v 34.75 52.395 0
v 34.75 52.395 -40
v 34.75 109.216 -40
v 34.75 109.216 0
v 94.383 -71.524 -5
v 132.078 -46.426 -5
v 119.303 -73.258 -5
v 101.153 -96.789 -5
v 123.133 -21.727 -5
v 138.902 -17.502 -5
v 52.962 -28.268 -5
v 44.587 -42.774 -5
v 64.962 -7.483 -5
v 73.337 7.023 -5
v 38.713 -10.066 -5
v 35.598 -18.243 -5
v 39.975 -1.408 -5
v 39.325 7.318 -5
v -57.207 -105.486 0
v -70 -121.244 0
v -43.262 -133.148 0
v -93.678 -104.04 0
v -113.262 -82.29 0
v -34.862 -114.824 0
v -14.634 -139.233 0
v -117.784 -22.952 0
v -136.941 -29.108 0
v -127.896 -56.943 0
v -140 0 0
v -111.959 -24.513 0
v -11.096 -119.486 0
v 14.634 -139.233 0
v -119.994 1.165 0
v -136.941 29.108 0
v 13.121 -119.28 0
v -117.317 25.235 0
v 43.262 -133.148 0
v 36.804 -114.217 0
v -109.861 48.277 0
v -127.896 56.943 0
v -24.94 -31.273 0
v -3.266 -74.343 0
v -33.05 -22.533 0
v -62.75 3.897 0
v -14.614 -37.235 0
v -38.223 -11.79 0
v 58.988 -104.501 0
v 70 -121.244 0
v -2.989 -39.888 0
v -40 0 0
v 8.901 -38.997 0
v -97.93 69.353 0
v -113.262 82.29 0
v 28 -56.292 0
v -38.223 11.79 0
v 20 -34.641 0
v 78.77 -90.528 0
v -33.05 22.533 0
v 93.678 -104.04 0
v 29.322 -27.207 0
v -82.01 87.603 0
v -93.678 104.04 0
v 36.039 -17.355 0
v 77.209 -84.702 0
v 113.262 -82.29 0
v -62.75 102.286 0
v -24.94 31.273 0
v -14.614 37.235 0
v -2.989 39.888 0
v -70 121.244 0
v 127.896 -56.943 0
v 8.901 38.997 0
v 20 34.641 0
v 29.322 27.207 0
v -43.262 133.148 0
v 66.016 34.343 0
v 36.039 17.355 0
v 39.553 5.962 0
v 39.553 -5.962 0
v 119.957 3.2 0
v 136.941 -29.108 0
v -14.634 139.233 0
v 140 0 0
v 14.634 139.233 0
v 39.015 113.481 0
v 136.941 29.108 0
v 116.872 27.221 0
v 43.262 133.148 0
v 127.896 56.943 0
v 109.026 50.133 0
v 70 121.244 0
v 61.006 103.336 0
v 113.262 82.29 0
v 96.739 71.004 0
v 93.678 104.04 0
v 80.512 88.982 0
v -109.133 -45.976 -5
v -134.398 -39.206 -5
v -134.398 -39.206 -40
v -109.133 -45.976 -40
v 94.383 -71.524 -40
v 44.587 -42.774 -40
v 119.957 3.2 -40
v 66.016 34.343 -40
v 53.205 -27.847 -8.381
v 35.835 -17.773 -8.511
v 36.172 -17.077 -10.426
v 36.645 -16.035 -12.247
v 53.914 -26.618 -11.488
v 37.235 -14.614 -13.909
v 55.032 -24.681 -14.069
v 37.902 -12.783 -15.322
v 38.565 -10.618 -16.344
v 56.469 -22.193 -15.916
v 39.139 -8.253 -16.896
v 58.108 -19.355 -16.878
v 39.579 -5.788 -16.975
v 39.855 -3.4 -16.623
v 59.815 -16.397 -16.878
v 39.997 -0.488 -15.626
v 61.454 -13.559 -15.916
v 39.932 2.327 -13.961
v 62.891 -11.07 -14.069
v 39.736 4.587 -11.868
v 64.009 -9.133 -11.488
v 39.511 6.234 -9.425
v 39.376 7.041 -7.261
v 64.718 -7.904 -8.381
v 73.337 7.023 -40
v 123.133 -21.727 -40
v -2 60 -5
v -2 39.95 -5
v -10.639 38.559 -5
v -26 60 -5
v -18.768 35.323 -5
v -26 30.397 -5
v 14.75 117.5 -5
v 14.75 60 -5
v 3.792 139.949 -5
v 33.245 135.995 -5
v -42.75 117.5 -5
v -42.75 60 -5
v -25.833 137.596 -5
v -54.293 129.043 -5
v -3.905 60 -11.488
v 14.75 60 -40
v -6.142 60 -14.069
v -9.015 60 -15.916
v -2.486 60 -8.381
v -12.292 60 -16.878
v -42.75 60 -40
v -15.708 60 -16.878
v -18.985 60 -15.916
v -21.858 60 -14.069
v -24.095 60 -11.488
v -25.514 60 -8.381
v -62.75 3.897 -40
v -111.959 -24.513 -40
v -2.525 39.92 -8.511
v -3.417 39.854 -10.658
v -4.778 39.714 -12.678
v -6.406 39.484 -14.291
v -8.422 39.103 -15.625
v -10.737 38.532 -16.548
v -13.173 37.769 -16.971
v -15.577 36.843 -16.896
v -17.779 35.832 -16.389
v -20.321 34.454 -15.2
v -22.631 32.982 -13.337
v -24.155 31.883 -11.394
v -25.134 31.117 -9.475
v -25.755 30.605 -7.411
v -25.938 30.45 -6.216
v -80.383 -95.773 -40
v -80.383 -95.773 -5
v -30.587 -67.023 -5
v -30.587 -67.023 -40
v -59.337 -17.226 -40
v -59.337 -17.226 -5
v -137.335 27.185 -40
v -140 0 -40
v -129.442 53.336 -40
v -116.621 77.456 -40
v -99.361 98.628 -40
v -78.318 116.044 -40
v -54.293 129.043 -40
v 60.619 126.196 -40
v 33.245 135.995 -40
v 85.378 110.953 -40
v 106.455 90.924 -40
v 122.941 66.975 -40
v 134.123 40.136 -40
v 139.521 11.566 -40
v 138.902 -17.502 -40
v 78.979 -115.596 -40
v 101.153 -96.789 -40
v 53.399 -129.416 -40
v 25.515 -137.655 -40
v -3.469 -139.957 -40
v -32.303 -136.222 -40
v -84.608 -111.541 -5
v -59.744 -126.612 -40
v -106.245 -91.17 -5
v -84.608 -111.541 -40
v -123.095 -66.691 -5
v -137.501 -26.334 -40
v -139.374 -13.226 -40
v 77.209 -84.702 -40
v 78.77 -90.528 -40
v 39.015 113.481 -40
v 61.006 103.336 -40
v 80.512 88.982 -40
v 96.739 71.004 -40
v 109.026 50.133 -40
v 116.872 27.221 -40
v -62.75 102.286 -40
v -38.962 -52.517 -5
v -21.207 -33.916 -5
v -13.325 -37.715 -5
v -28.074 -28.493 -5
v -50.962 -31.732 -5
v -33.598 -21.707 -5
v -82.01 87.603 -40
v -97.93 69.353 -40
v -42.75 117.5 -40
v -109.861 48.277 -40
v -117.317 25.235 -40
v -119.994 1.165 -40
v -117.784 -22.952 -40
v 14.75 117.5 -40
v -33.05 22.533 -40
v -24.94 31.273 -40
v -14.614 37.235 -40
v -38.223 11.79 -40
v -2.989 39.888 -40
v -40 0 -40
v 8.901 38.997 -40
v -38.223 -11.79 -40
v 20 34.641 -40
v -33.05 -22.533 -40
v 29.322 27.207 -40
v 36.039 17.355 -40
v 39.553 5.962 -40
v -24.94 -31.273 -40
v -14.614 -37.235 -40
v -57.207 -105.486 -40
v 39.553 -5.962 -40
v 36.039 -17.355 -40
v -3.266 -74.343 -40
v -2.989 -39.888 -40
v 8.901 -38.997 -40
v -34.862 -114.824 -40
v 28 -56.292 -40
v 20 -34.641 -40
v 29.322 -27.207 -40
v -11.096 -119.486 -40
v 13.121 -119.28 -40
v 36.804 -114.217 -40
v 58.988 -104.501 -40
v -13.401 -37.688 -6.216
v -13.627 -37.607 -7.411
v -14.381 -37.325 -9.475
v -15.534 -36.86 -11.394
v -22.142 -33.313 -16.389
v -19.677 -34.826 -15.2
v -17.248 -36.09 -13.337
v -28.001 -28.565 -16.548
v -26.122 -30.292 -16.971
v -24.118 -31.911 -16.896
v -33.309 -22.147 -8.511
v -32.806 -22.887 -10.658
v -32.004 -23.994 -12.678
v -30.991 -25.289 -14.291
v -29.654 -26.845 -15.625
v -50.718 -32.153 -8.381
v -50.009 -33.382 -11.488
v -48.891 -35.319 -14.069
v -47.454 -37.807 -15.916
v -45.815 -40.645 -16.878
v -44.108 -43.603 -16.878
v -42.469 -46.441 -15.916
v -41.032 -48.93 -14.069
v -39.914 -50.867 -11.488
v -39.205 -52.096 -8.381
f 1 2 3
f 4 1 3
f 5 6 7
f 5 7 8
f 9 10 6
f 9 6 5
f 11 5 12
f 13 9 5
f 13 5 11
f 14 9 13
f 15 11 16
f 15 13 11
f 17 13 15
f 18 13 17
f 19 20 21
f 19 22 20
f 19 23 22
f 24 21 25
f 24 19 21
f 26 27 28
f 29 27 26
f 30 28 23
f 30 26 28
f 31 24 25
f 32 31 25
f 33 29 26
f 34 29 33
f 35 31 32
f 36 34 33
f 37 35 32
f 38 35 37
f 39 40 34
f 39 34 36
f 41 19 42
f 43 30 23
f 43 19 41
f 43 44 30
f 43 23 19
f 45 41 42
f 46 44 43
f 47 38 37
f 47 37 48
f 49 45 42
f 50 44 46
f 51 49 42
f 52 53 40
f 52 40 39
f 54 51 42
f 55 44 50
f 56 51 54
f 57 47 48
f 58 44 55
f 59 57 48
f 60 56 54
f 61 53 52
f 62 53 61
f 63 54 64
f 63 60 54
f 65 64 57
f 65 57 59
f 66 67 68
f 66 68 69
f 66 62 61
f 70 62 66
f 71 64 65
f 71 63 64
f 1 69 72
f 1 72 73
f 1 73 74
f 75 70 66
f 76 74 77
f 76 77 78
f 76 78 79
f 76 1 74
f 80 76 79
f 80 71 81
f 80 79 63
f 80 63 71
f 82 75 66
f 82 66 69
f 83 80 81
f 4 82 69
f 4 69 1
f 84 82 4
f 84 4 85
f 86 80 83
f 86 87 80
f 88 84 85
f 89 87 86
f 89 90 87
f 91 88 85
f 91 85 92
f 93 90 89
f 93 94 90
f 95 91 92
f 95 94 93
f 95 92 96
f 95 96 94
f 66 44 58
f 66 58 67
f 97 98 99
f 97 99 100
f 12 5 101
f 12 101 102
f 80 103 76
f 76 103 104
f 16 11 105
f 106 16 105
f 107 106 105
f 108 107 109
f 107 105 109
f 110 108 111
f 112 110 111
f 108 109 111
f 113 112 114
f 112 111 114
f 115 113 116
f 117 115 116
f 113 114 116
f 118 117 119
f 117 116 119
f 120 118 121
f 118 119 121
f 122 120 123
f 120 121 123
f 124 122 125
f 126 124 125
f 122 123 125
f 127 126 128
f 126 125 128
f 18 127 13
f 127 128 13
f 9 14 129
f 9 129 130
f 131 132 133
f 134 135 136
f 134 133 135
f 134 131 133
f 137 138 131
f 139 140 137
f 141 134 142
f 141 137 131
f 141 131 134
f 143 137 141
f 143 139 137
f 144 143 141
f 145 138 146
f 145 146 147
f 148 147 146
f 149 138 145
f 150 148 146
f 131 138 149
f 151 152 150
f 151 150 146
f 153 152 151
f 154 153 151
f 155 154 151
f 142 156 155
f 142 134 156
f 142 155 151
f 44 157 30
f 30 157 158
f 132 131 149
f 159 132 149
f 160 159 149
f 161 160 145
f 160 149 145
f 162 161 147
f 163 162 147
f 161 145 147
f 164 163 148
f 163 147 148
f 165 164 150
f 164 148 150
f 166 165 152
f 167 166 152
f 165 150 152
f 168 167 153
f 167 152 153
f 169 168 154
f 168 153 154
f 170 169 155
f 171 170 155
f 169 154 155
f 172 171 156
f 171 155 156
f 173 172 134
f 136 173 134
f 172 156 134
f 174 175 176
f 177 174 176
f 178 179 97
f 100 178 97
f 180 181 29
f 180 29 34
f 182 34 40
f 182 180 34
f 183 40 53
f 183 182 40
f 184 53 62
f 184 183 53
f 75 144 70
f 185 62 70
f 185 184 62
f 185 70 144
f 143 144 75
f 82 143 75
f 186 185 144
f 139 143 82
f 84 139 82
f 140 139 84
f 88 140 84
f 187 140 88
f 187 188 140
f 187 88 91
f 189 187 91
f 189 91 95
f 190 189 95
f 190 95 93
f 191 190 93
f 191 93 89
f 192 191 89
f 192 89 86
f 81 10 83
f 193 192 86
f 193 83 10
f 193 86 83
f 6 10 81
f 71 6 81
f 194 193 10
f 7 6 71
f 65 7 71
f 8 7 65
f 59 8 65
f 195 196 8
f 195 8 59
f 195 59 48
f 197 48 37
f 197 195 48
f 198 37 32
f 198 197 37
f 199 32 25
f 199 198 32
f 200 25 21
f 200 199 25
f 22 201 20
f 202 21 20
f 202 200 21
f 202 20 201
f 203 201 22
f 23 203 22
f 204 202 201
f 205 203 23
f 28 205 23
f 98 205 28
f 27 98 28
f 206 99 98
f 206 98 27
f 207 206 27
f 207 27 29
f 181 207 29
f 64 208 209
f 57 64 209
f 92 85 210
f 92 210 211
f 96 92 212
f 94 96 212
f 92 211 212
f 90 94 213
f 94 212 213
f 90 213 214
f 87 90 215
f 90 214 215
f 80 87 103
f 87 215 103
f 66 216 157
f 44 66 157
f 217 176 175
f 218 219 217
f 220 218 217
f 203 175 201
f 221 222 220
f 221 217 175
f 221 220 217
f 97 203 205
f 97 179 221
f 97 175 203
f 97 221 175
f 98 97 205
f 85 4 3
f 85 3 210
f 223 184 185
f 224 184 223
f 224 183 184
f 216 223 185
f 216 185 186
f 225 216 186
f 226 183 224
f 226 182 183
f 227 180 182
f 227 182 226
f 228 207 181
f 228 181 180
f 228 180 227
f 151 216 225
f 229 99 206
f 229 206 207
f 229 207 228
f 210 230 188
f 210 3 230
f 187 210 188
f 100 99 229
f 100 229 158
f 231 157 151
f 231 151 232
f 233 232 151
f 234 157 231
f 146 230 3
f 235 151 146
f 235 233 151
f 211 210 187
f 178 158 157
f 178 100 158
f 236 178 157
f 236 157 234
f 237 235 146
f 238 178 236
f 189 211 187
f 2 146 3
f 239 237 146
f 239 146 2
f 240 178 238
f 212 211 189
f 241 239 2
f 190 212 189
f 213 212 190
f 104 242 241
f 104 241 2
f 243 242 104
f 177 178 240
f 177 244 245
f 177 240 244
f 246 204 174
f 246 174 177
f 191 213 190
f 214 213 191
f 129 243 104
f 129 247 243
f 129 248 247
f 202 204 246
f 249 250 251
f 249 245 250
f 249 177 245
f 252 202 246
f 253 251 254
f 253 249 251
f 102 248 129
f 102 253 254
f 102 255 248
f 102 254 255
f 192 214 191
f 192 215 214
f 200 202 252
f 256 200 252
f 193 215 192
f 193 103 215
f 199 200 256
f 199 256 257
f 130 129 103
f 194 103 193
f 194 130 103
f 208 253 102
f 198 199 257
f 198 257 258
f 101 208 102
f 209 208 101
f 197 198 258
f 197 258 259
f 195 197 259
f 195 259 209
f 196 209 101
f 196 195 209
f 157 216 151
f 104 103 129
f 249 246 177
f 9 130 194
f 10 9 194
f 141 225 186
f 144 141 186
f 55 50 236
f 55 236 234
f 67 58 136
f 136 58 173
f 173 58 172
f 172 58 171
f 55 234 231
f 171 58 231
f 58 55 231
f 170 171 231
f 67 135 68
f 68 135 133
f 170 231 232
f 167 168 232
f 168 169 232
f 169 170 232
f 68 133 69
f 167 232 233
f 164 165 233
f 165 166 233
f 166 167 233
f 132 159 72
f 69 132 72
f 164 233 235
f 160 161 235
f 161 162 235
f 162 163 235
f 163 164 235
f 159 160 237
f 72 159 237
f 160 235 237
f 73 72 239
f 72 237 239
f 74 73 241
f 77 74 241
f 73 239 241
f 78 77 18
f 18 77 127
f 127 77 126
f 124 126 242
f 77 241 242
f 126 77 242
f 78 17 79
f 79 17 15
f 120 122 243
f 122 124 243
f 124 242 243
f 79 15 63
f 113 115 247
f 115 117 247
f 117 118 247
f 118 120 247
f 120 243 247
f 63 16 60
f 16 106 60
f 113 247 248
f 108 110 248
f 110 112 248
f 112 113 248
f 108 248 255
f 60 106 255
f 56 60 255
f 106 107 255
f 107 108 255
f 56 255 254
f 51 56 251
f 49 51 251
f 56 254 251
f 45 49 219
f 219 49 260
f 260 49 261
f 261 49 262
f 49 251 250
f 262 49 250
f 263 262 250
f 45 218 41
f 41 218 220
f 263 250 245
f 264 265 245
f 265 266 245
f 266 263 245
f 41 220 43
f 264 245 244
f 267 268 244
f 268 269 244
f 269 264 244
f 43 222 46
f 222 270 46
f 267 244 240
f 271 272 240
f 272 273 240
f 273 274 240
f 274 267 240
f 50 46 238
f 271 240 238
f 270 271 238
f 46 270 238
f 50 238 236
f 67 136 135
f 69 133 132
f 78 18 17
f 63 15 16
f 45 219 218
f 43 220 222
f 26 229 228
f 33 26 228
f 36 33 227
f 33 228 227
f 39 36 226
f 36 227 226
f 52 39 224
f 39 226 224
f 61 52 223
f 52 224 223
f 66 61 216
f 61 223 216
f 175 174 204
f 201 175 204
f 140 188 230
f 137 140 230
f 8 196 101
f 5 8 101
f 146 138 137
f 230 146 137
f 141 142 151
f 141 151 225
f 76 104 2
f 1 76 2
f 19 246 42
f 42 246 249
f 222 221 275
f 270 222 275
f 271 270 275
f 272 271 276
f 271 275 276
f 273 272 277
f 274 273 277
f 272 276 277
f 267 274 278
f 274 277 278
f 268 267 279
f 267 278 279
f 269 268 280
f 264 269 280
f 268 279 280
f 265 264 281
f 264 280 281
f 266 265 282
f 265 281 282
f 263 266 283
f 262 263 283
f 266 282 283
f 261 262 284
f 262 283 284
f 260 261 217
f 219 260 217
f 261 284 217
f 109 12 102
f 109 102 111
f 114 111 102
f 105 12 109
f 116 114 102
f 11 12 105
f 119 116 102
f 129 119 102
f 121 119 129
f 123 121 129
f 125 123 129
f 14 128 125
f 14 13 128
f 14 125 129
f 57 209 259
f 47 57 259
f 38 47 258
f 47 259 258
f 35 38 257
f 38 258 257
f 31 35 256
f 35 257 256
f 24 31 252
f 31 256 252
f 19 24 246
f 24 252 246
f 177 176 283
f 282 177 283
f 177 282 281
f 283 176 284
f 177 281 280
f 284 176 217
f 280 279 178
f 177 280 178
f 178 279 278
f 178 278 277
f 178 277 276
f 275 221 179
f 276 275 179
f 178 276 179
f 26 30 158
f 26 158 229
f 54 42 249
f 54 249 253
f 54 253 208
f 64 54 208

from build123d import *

# Parameters (mm, degrees)
SKETCH1_R               = 250
BOSS_EXTRUDE1_DEPTH     = 5
SKETCH2_R               = 250
SKETCH2_W               = 57.5
SKETCH2_H               = 57.5
BOSS_EXTRUDE2_DEPTH     = 35
SKETCH3_R               = 250
SKETCH3_R_2             = 140
CUT_EXTRUDE1_DEPTH      = 356.808937493
CUT_EXTRUDE2_DEPTH      = 35
SKETCH5_R               = 40
CUT_EXTRUDE3_DEPTH      = 202.990098767
CUT_EXTRUDE4_REACH      = 261.517
CUT_EXTRUDE4_END_RADIUS = 40
CUT_EXTRUDE5_REACH      = 249.386
CUT_EXTRUDE5_END_RADIUS = 40
CUT_EXTRUDE6_REACH      = 261.517
CUT_EXTRUDE6_END_RADIUS = 40
CUT_EXTRUDE7_DEPTH      = 202.990098787


with BuildPart() as part:
    # Sketch1 → Boss-Extrude1 (new body)
    with BuildSketch(Plane.XY):
        Circle(SKETCH1_R)
    extrude(amount=-BOSS_EXTRUDE1_DEPTH)

    # Sketch2 → Boss-Extrude2 (add)
    with BuildSketch(Plane(origin=(0, 0, -5), x_dir=(-1, 0, 0), z_dir=(0, 0, -1))):
        with Locations(Location((0, 0, 0), (0, 0, 180))):
            Circle(SKETCH2_R)
        Polygon((-73.336524227, 7.022586012), (-123.132984945, -21.727413988), (-94.382984945, -71.523874706), (-44.586524227, -42.773874706), align=None, mode=Mode.SUBTRACT)
        with Locations((14, 88.75)):
            Rectangle(SKETCH2_W, SKETCH2_H, mode=Mode.SUBTRACT)
        Polygon((80.382984945, -95.772586012), (30.586524227, -67.022586012), (59.336524227, -17.226125294), (109.132984945, -45.976125294), align=None, mode=Mode.SUBTRACT)
    extrude(amount=BOSS_EXTRUDE2_DEPTH)

    # Sketch3 → Cut-Extrude1 (cut, through all)
    with BuildSketch(Plane(origin=(0, 0, -40), x_dir=(-1, 0, 0), z_dir=(0, 0, -1))):
        Circle(SKETCH3_R)
        Circle(SKETCH3_R_2, mode=Mode.SUBTRACT)
    extrude(amount=-CUT_EXTRUDE1_DEPTH, mode=Mode.SUBTRACT)

    # Sketch4 → Cut-Extrude2 (cut)
    with BuildSketch(Plane(origin=(0, 0, -40), x_dir=(-1, 0, 0), z_dir=(0, 0, -1))):
        with BuildLine():
            Line((42.75, 117.5), (54.293475361, 129.043475361))
            ThreePointArc((54.293475361, 129.043475361), (11.083221394, 139.560604053), (-33.245383921, 135.995383921))
            Line((-33.245383921, 135.995383921), (-14.75, 117.5))
            Line((-14.75, 117.5), (42.75, 117.5))
        make_face()
        with BuildLine():
            Line((-123.132984945, -21.727413988), (-138.901665536, -17.502208758))
            ThreePointArc((-138.901665536, -17.502208758), (-126.404639174, -60.181950743), (-101.152765313, -96.789038995))
            Line((-101.152765313, -96.789038995), (-94.382984945, -71.523874706))
            Line((-94.382984945, -71.523874706), (-123.132984945, -21.727413988))
        make_face()
        with BuildLine():
            Line((80.382984945, -95.772586012), (84.608190175, -111.541266603))
            ThreePointArc((84.608190175, -111.541266603), (115.32141778, -79.378653309), (134.398149234, -39.206344926))
            Line((134.398149234, -39.206344926), (109.132984945, -45.976125294))
            Line((109.132984945, -45.976125294), (80.382984945, -95.772586012))
        make_face()
    extrude(amount=-CUT_EXTRUDE2_DEPTH, mode=Mode.SUBTRACT)

    # Sketch5 → Cut-Extrude3 (cut, through all)
    with BuildSketch(Plane(origin=(0, 0, -40), x_dir=(-1, 0, 0), z_dir=(0, 0, -1))):
        Circle(SKETCH5_R)
    extrude(amount=-CUT_EXTRUDE3_DEPTH, mode=Mode.SUBTRACT)

    # Cut-Extrude4: up to this cylinder (the profile starts outside it)
    cut_extrude4_end = Plane(origin=(0, 0, -10.092958), z_dir=(0, 0, -1)) * Cylinder(CUT_EXTRUDE4_END_RADIUS, 604.034, mode=Mode.PRIVATE)
    # Sketch7 → Cut-Extrude4 (cut, up to the surface)
    with BuildSketch(Plane(origin=(-51.961524227, -30, 0), x_dir=(0, 0, 1), z_dir=(-0.866025403784445, -0.49999999999998906, 0)), mode=Mode.PRIVATE) as cut_extrude4_sk1:
        with BuildLine():
            Line((-5, -26), (-5, -2))
            ThreePointArc((-5, -2), (-17, -14), (-5, -26))
        make_face()
    cut_extrude4_tool1 = extrude(cut_extrude4_sk1.sketch, amount=-CUT_EXTRUDE4_REACH, mode=Mode.PRIVATE) - cut_extrude4_end
    add(cut_extrude4_tool1.solids().sort_by_distance((-44.961524, -42.124356, -10.092958))[0], mode=Mode.SUBTRACT)

    # Cut-Extrude5: up to this cylinder (the profile starts outside it)
    cut_extrude5_end = Plane(origin=(0, 0, -10.092958), z_dir=(0, 0, -1)) * Cylinder(CUT_EXTRUDE5_END_RADIUS, 579.772, mode=Mode.PRIVATE)
    # Sketch8 → Cut-Extrude5 (cut, up to the surface)
    with BuildSketch(Plane(origin=(0, 60, 0), x_dir=(1, 0, 0), z_dir=(0, 1, 0)), mode=Mode.PRIVATE) as cut_extrude5_sk1:
        with BuildLine():
            Line((-26, 5), (-2, 5))
            ThreePointArc((-2, 5), (-14, 17), (-26, 5))
        make_face()
    cut_extrude5_tool1 = extrude(cut_extrude5_sk1.sketch, amount=-CUT_EXTRUDE5_REACH, mode=Mode.PRIVATE) - cut_extrude5_end
    add(cut_extrude5_tool1.solids().sort_by_distance((-14, 60, -10.092958))[0], mode=Mode.SUBTRACT)

    # Cut-Extrude6: up to this cylinder (the profile starts outside it)
    cut_extrude6_end = Plane(origin=(0, 0, -10.092958), z_dir=(0, 0, -1)) * Cylinder(CUT_EXTRUDE6_END_RADIUS, 604.034, mode=Mode.PRIVATE)
    # Sketch9 → Cut-Extrude6 (cut, up to the surface)
    with BuildSketch(Plane(origin=(51.961524227, -30, 0), x_dir=(0, 0, -1), z_dir=(0.8660254037844376, -0.5000000000000019, 0)), mode=Mode.PRIVATE) as cut_extrude6_sk1:
        with BuildLine():
            Line((5, 26), (5, 2))
            ThreePointArc((5, 2), (17, 14), (5, 26))
        make_face()
    cut_extrude6_tool1 = extrude(cut_extrude6_sk1.sketch, amount=-CUT_EXTRUDE6_REACH, mode=Mode.PRIVATE) - cut_extrude6_end
    add(cut_extrude6_tool1.solids().sort_by_distance((58.961524, -17.875644, -10.092958))[0], mode=Mode.SUBTRACT)

    # Sketch10 → Cut-Extrude7 (cut, through all)
    with BuildSketch(Plane(origin=(0, 0, -40), x_dir=(-1, 0, 0), z_dir=(0, 0, -1))):
        with BuildLine():
            Line((62.75, 40), (62.75, 3.897114317))
            Line((62.75, 3.897114317), (111.958595593, -24.513481595))
            Line((111.958595593, -24.513481595), (117.784487806, -22.952438481))
            ThreePointArc((117.784487806, -22.952438481), (109.860573104, 48.276852396), (62.75, 102.286057212))
            Line((62.75, 102.286057212), (62.75, 40))
        make_face()
        with BuildLine():
            Line((3.266016151, -74.343094087), (-28, -56.291651246))
            Line((-28, -56.291651246), (-77.208595593, -84.702247158))
            Line((-77.208595593, -84.702247158), (-78.769638706, -90.528139372))
            ThreePointArc((-78.769638706, -90.528139372), (-13.121305962, -119.28047338), (57.207323999, -105.486122694))
            Line((57.207323999, -105.486122694), (3.266016151, -74.343094087))
        make_face()
        with BuildLine():
            Line((-66.016016151, 34.343094087), (-34.75, 52.394536929))
            Line((-34.75, 52.394536929), (-34.75, 109.215728753))
            Line((-34.75, 109.215728753), (-39.0148491, 113.480577852))
            ThreePointArc((-39.0148491, 113.480577852), (-96.739267142, 71.003620984), (-119.957323999, 3.200065481))
            Line((-119.957323999, 3.200065481), (-66.016016151, 34.343094087))
        make_face()
    extrude(amount=-CUT_EXTRUDE7_DEPTH, mode=Mode.SUBTRACT)


solid = part.part
